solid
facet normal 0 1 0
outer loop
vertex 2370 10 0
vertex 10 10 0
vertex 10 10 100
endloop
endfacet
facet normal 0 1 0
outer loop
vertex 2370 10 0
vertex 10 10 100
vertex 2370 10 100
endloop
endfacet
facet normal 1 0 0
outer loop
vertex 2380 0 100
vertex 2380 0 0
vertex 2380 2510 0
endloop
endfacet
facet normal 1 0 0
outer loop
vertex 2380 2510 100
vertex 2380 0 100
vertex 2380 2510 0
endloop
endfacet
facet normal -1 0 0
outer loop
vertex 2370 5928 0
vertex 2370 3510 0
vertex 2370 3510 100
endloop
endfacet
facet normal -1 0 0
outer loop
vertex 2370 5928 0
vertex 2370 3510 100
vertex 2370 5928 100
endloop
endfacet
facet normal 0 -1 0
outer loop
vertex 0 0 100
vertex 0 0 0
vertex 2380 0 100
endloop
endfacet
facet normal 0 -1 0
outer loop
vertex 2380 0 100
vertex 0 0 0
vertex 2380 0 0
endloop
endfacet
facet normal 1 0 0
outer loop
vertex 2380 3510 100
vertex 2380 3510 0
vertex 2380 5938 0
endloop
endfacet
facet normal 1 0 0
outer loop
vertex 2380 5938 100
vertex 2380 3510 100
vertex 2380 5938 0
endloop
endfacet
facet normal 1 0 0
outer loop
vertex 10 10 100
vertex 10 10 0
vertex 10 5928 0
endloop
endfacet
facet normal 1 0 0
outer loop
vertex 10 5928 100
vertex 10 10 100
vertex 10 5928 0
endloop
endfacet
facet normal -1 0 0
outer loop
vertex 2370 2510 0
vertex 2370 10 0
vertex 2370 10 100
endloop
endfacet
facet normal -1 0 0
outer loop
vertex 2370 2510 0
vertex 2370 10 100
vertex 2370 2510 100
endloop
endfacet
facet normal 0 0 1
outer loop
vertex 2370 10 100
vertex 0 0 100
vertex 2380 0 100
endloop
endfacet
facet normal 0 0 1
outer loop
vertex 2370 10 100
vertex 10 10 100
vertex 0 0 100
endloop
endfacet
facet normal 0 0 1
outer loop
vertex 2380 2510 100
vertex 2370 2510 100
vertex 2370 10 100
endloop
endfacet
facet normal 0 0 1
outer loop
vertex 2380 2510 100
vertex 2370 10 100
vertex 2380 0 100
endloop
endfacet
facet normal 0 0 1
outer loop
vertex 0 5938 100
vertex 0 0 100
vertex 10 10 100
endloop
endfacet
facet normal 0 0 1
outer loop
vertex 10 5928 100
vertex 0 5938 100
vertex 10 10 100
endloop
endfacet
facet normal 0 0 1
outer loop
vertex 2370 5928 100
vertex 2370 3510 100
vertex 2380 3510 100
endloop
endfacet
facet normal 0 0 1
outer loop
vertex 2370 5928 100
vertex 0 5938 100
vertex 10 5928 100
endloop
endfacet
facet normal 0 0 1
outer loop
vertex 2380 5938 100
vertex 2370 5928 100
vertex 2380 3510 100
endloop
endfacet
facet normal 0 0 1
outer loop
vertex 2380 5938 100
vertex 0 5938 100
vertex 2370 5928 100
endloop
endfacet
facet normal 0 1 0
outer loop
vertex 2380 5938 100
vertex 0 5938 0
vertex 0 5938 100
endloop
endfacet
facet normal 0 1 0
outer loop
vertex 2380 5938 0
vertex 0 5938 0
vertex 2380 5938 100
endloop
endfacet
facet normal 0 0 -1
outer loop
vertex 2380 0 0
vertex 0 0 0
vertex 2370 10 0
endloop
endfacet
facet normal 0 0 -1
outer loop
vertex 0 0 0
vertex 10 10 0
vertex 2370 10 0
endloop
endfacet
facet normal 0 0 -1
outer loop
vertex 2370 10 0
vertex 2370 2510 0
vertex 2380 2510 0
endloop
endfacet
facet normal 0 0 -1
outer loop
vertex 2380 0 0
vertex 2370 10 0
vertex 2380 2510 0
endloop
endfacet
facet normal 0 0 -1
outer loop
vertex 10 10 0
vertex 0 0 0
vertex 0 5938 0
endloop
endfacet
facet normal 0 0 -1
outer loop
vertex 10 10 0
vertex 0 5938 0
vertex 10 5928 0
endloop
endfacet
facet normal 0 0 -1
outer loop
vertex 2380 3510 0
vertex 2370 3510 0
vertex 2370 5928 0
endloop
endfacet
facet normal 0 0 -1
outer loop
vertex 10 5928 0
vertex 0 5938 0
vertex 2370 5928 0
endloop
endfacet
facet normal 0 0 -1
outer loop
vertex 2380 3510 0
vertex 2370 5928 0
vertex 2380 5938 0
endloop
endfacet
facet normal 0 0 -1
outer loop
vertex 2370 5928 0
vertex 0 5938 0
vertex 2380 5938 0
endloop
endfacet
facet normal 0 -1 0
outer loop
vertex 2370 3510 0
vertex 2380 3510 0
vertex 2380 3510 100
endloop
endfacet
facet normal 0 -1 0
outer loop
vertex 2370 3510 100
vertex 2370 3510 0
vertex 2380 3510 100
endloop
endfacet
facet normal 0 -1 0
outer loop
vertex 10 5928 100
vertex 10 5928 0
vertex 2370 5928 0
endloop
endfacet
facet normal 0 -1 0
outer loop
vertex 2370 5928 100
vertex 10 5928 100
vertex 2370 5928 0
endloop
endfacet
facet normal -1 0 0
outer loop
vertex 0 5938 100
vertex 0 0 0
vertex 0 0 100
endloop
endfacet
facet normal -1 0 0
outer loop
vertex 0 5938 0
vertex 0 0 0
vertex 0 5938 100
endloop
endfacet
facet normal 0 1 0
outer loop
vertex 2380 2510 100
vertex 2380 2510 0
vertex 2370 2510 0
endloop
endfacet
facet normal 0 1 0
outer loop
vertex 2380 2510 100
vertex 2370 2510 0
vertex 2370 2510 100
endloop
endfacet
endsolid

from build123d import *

# Parameters (mm, degrees)
F0_W     = 2380
F0_H     = 5938
F0_W_2   = 2360
F0_H_2   = 5918
F1_DEPTH = 100
F2_W     = 1000
F2_H     = 100
F3_DEPTH = 25


with BuildPart() as f1:
    # F0 (on Top) → F1 (new body)
    with BuildSketch(Plane.XY):
        with Locations((1190, 2969)):
            Rectangle(F0_W, F0_H)
        with Locations((1190, 2969)):
            Rectangle(F0_W_2, F0_H_2, mode=Mode.SUBTRACT)
    extrude(amount=F1_DEPTH)

    # F2 (on face) → F3 (cut)
    with BuildSketch(Plane.YZ.offset(2380)):
        with Locations((3010, 50)):
            Rectangle(F2_W, F2_H)
    extrude(amount=-F3_DEPTH, mode=Mode.SUBTRACT)


solid = f1.part
